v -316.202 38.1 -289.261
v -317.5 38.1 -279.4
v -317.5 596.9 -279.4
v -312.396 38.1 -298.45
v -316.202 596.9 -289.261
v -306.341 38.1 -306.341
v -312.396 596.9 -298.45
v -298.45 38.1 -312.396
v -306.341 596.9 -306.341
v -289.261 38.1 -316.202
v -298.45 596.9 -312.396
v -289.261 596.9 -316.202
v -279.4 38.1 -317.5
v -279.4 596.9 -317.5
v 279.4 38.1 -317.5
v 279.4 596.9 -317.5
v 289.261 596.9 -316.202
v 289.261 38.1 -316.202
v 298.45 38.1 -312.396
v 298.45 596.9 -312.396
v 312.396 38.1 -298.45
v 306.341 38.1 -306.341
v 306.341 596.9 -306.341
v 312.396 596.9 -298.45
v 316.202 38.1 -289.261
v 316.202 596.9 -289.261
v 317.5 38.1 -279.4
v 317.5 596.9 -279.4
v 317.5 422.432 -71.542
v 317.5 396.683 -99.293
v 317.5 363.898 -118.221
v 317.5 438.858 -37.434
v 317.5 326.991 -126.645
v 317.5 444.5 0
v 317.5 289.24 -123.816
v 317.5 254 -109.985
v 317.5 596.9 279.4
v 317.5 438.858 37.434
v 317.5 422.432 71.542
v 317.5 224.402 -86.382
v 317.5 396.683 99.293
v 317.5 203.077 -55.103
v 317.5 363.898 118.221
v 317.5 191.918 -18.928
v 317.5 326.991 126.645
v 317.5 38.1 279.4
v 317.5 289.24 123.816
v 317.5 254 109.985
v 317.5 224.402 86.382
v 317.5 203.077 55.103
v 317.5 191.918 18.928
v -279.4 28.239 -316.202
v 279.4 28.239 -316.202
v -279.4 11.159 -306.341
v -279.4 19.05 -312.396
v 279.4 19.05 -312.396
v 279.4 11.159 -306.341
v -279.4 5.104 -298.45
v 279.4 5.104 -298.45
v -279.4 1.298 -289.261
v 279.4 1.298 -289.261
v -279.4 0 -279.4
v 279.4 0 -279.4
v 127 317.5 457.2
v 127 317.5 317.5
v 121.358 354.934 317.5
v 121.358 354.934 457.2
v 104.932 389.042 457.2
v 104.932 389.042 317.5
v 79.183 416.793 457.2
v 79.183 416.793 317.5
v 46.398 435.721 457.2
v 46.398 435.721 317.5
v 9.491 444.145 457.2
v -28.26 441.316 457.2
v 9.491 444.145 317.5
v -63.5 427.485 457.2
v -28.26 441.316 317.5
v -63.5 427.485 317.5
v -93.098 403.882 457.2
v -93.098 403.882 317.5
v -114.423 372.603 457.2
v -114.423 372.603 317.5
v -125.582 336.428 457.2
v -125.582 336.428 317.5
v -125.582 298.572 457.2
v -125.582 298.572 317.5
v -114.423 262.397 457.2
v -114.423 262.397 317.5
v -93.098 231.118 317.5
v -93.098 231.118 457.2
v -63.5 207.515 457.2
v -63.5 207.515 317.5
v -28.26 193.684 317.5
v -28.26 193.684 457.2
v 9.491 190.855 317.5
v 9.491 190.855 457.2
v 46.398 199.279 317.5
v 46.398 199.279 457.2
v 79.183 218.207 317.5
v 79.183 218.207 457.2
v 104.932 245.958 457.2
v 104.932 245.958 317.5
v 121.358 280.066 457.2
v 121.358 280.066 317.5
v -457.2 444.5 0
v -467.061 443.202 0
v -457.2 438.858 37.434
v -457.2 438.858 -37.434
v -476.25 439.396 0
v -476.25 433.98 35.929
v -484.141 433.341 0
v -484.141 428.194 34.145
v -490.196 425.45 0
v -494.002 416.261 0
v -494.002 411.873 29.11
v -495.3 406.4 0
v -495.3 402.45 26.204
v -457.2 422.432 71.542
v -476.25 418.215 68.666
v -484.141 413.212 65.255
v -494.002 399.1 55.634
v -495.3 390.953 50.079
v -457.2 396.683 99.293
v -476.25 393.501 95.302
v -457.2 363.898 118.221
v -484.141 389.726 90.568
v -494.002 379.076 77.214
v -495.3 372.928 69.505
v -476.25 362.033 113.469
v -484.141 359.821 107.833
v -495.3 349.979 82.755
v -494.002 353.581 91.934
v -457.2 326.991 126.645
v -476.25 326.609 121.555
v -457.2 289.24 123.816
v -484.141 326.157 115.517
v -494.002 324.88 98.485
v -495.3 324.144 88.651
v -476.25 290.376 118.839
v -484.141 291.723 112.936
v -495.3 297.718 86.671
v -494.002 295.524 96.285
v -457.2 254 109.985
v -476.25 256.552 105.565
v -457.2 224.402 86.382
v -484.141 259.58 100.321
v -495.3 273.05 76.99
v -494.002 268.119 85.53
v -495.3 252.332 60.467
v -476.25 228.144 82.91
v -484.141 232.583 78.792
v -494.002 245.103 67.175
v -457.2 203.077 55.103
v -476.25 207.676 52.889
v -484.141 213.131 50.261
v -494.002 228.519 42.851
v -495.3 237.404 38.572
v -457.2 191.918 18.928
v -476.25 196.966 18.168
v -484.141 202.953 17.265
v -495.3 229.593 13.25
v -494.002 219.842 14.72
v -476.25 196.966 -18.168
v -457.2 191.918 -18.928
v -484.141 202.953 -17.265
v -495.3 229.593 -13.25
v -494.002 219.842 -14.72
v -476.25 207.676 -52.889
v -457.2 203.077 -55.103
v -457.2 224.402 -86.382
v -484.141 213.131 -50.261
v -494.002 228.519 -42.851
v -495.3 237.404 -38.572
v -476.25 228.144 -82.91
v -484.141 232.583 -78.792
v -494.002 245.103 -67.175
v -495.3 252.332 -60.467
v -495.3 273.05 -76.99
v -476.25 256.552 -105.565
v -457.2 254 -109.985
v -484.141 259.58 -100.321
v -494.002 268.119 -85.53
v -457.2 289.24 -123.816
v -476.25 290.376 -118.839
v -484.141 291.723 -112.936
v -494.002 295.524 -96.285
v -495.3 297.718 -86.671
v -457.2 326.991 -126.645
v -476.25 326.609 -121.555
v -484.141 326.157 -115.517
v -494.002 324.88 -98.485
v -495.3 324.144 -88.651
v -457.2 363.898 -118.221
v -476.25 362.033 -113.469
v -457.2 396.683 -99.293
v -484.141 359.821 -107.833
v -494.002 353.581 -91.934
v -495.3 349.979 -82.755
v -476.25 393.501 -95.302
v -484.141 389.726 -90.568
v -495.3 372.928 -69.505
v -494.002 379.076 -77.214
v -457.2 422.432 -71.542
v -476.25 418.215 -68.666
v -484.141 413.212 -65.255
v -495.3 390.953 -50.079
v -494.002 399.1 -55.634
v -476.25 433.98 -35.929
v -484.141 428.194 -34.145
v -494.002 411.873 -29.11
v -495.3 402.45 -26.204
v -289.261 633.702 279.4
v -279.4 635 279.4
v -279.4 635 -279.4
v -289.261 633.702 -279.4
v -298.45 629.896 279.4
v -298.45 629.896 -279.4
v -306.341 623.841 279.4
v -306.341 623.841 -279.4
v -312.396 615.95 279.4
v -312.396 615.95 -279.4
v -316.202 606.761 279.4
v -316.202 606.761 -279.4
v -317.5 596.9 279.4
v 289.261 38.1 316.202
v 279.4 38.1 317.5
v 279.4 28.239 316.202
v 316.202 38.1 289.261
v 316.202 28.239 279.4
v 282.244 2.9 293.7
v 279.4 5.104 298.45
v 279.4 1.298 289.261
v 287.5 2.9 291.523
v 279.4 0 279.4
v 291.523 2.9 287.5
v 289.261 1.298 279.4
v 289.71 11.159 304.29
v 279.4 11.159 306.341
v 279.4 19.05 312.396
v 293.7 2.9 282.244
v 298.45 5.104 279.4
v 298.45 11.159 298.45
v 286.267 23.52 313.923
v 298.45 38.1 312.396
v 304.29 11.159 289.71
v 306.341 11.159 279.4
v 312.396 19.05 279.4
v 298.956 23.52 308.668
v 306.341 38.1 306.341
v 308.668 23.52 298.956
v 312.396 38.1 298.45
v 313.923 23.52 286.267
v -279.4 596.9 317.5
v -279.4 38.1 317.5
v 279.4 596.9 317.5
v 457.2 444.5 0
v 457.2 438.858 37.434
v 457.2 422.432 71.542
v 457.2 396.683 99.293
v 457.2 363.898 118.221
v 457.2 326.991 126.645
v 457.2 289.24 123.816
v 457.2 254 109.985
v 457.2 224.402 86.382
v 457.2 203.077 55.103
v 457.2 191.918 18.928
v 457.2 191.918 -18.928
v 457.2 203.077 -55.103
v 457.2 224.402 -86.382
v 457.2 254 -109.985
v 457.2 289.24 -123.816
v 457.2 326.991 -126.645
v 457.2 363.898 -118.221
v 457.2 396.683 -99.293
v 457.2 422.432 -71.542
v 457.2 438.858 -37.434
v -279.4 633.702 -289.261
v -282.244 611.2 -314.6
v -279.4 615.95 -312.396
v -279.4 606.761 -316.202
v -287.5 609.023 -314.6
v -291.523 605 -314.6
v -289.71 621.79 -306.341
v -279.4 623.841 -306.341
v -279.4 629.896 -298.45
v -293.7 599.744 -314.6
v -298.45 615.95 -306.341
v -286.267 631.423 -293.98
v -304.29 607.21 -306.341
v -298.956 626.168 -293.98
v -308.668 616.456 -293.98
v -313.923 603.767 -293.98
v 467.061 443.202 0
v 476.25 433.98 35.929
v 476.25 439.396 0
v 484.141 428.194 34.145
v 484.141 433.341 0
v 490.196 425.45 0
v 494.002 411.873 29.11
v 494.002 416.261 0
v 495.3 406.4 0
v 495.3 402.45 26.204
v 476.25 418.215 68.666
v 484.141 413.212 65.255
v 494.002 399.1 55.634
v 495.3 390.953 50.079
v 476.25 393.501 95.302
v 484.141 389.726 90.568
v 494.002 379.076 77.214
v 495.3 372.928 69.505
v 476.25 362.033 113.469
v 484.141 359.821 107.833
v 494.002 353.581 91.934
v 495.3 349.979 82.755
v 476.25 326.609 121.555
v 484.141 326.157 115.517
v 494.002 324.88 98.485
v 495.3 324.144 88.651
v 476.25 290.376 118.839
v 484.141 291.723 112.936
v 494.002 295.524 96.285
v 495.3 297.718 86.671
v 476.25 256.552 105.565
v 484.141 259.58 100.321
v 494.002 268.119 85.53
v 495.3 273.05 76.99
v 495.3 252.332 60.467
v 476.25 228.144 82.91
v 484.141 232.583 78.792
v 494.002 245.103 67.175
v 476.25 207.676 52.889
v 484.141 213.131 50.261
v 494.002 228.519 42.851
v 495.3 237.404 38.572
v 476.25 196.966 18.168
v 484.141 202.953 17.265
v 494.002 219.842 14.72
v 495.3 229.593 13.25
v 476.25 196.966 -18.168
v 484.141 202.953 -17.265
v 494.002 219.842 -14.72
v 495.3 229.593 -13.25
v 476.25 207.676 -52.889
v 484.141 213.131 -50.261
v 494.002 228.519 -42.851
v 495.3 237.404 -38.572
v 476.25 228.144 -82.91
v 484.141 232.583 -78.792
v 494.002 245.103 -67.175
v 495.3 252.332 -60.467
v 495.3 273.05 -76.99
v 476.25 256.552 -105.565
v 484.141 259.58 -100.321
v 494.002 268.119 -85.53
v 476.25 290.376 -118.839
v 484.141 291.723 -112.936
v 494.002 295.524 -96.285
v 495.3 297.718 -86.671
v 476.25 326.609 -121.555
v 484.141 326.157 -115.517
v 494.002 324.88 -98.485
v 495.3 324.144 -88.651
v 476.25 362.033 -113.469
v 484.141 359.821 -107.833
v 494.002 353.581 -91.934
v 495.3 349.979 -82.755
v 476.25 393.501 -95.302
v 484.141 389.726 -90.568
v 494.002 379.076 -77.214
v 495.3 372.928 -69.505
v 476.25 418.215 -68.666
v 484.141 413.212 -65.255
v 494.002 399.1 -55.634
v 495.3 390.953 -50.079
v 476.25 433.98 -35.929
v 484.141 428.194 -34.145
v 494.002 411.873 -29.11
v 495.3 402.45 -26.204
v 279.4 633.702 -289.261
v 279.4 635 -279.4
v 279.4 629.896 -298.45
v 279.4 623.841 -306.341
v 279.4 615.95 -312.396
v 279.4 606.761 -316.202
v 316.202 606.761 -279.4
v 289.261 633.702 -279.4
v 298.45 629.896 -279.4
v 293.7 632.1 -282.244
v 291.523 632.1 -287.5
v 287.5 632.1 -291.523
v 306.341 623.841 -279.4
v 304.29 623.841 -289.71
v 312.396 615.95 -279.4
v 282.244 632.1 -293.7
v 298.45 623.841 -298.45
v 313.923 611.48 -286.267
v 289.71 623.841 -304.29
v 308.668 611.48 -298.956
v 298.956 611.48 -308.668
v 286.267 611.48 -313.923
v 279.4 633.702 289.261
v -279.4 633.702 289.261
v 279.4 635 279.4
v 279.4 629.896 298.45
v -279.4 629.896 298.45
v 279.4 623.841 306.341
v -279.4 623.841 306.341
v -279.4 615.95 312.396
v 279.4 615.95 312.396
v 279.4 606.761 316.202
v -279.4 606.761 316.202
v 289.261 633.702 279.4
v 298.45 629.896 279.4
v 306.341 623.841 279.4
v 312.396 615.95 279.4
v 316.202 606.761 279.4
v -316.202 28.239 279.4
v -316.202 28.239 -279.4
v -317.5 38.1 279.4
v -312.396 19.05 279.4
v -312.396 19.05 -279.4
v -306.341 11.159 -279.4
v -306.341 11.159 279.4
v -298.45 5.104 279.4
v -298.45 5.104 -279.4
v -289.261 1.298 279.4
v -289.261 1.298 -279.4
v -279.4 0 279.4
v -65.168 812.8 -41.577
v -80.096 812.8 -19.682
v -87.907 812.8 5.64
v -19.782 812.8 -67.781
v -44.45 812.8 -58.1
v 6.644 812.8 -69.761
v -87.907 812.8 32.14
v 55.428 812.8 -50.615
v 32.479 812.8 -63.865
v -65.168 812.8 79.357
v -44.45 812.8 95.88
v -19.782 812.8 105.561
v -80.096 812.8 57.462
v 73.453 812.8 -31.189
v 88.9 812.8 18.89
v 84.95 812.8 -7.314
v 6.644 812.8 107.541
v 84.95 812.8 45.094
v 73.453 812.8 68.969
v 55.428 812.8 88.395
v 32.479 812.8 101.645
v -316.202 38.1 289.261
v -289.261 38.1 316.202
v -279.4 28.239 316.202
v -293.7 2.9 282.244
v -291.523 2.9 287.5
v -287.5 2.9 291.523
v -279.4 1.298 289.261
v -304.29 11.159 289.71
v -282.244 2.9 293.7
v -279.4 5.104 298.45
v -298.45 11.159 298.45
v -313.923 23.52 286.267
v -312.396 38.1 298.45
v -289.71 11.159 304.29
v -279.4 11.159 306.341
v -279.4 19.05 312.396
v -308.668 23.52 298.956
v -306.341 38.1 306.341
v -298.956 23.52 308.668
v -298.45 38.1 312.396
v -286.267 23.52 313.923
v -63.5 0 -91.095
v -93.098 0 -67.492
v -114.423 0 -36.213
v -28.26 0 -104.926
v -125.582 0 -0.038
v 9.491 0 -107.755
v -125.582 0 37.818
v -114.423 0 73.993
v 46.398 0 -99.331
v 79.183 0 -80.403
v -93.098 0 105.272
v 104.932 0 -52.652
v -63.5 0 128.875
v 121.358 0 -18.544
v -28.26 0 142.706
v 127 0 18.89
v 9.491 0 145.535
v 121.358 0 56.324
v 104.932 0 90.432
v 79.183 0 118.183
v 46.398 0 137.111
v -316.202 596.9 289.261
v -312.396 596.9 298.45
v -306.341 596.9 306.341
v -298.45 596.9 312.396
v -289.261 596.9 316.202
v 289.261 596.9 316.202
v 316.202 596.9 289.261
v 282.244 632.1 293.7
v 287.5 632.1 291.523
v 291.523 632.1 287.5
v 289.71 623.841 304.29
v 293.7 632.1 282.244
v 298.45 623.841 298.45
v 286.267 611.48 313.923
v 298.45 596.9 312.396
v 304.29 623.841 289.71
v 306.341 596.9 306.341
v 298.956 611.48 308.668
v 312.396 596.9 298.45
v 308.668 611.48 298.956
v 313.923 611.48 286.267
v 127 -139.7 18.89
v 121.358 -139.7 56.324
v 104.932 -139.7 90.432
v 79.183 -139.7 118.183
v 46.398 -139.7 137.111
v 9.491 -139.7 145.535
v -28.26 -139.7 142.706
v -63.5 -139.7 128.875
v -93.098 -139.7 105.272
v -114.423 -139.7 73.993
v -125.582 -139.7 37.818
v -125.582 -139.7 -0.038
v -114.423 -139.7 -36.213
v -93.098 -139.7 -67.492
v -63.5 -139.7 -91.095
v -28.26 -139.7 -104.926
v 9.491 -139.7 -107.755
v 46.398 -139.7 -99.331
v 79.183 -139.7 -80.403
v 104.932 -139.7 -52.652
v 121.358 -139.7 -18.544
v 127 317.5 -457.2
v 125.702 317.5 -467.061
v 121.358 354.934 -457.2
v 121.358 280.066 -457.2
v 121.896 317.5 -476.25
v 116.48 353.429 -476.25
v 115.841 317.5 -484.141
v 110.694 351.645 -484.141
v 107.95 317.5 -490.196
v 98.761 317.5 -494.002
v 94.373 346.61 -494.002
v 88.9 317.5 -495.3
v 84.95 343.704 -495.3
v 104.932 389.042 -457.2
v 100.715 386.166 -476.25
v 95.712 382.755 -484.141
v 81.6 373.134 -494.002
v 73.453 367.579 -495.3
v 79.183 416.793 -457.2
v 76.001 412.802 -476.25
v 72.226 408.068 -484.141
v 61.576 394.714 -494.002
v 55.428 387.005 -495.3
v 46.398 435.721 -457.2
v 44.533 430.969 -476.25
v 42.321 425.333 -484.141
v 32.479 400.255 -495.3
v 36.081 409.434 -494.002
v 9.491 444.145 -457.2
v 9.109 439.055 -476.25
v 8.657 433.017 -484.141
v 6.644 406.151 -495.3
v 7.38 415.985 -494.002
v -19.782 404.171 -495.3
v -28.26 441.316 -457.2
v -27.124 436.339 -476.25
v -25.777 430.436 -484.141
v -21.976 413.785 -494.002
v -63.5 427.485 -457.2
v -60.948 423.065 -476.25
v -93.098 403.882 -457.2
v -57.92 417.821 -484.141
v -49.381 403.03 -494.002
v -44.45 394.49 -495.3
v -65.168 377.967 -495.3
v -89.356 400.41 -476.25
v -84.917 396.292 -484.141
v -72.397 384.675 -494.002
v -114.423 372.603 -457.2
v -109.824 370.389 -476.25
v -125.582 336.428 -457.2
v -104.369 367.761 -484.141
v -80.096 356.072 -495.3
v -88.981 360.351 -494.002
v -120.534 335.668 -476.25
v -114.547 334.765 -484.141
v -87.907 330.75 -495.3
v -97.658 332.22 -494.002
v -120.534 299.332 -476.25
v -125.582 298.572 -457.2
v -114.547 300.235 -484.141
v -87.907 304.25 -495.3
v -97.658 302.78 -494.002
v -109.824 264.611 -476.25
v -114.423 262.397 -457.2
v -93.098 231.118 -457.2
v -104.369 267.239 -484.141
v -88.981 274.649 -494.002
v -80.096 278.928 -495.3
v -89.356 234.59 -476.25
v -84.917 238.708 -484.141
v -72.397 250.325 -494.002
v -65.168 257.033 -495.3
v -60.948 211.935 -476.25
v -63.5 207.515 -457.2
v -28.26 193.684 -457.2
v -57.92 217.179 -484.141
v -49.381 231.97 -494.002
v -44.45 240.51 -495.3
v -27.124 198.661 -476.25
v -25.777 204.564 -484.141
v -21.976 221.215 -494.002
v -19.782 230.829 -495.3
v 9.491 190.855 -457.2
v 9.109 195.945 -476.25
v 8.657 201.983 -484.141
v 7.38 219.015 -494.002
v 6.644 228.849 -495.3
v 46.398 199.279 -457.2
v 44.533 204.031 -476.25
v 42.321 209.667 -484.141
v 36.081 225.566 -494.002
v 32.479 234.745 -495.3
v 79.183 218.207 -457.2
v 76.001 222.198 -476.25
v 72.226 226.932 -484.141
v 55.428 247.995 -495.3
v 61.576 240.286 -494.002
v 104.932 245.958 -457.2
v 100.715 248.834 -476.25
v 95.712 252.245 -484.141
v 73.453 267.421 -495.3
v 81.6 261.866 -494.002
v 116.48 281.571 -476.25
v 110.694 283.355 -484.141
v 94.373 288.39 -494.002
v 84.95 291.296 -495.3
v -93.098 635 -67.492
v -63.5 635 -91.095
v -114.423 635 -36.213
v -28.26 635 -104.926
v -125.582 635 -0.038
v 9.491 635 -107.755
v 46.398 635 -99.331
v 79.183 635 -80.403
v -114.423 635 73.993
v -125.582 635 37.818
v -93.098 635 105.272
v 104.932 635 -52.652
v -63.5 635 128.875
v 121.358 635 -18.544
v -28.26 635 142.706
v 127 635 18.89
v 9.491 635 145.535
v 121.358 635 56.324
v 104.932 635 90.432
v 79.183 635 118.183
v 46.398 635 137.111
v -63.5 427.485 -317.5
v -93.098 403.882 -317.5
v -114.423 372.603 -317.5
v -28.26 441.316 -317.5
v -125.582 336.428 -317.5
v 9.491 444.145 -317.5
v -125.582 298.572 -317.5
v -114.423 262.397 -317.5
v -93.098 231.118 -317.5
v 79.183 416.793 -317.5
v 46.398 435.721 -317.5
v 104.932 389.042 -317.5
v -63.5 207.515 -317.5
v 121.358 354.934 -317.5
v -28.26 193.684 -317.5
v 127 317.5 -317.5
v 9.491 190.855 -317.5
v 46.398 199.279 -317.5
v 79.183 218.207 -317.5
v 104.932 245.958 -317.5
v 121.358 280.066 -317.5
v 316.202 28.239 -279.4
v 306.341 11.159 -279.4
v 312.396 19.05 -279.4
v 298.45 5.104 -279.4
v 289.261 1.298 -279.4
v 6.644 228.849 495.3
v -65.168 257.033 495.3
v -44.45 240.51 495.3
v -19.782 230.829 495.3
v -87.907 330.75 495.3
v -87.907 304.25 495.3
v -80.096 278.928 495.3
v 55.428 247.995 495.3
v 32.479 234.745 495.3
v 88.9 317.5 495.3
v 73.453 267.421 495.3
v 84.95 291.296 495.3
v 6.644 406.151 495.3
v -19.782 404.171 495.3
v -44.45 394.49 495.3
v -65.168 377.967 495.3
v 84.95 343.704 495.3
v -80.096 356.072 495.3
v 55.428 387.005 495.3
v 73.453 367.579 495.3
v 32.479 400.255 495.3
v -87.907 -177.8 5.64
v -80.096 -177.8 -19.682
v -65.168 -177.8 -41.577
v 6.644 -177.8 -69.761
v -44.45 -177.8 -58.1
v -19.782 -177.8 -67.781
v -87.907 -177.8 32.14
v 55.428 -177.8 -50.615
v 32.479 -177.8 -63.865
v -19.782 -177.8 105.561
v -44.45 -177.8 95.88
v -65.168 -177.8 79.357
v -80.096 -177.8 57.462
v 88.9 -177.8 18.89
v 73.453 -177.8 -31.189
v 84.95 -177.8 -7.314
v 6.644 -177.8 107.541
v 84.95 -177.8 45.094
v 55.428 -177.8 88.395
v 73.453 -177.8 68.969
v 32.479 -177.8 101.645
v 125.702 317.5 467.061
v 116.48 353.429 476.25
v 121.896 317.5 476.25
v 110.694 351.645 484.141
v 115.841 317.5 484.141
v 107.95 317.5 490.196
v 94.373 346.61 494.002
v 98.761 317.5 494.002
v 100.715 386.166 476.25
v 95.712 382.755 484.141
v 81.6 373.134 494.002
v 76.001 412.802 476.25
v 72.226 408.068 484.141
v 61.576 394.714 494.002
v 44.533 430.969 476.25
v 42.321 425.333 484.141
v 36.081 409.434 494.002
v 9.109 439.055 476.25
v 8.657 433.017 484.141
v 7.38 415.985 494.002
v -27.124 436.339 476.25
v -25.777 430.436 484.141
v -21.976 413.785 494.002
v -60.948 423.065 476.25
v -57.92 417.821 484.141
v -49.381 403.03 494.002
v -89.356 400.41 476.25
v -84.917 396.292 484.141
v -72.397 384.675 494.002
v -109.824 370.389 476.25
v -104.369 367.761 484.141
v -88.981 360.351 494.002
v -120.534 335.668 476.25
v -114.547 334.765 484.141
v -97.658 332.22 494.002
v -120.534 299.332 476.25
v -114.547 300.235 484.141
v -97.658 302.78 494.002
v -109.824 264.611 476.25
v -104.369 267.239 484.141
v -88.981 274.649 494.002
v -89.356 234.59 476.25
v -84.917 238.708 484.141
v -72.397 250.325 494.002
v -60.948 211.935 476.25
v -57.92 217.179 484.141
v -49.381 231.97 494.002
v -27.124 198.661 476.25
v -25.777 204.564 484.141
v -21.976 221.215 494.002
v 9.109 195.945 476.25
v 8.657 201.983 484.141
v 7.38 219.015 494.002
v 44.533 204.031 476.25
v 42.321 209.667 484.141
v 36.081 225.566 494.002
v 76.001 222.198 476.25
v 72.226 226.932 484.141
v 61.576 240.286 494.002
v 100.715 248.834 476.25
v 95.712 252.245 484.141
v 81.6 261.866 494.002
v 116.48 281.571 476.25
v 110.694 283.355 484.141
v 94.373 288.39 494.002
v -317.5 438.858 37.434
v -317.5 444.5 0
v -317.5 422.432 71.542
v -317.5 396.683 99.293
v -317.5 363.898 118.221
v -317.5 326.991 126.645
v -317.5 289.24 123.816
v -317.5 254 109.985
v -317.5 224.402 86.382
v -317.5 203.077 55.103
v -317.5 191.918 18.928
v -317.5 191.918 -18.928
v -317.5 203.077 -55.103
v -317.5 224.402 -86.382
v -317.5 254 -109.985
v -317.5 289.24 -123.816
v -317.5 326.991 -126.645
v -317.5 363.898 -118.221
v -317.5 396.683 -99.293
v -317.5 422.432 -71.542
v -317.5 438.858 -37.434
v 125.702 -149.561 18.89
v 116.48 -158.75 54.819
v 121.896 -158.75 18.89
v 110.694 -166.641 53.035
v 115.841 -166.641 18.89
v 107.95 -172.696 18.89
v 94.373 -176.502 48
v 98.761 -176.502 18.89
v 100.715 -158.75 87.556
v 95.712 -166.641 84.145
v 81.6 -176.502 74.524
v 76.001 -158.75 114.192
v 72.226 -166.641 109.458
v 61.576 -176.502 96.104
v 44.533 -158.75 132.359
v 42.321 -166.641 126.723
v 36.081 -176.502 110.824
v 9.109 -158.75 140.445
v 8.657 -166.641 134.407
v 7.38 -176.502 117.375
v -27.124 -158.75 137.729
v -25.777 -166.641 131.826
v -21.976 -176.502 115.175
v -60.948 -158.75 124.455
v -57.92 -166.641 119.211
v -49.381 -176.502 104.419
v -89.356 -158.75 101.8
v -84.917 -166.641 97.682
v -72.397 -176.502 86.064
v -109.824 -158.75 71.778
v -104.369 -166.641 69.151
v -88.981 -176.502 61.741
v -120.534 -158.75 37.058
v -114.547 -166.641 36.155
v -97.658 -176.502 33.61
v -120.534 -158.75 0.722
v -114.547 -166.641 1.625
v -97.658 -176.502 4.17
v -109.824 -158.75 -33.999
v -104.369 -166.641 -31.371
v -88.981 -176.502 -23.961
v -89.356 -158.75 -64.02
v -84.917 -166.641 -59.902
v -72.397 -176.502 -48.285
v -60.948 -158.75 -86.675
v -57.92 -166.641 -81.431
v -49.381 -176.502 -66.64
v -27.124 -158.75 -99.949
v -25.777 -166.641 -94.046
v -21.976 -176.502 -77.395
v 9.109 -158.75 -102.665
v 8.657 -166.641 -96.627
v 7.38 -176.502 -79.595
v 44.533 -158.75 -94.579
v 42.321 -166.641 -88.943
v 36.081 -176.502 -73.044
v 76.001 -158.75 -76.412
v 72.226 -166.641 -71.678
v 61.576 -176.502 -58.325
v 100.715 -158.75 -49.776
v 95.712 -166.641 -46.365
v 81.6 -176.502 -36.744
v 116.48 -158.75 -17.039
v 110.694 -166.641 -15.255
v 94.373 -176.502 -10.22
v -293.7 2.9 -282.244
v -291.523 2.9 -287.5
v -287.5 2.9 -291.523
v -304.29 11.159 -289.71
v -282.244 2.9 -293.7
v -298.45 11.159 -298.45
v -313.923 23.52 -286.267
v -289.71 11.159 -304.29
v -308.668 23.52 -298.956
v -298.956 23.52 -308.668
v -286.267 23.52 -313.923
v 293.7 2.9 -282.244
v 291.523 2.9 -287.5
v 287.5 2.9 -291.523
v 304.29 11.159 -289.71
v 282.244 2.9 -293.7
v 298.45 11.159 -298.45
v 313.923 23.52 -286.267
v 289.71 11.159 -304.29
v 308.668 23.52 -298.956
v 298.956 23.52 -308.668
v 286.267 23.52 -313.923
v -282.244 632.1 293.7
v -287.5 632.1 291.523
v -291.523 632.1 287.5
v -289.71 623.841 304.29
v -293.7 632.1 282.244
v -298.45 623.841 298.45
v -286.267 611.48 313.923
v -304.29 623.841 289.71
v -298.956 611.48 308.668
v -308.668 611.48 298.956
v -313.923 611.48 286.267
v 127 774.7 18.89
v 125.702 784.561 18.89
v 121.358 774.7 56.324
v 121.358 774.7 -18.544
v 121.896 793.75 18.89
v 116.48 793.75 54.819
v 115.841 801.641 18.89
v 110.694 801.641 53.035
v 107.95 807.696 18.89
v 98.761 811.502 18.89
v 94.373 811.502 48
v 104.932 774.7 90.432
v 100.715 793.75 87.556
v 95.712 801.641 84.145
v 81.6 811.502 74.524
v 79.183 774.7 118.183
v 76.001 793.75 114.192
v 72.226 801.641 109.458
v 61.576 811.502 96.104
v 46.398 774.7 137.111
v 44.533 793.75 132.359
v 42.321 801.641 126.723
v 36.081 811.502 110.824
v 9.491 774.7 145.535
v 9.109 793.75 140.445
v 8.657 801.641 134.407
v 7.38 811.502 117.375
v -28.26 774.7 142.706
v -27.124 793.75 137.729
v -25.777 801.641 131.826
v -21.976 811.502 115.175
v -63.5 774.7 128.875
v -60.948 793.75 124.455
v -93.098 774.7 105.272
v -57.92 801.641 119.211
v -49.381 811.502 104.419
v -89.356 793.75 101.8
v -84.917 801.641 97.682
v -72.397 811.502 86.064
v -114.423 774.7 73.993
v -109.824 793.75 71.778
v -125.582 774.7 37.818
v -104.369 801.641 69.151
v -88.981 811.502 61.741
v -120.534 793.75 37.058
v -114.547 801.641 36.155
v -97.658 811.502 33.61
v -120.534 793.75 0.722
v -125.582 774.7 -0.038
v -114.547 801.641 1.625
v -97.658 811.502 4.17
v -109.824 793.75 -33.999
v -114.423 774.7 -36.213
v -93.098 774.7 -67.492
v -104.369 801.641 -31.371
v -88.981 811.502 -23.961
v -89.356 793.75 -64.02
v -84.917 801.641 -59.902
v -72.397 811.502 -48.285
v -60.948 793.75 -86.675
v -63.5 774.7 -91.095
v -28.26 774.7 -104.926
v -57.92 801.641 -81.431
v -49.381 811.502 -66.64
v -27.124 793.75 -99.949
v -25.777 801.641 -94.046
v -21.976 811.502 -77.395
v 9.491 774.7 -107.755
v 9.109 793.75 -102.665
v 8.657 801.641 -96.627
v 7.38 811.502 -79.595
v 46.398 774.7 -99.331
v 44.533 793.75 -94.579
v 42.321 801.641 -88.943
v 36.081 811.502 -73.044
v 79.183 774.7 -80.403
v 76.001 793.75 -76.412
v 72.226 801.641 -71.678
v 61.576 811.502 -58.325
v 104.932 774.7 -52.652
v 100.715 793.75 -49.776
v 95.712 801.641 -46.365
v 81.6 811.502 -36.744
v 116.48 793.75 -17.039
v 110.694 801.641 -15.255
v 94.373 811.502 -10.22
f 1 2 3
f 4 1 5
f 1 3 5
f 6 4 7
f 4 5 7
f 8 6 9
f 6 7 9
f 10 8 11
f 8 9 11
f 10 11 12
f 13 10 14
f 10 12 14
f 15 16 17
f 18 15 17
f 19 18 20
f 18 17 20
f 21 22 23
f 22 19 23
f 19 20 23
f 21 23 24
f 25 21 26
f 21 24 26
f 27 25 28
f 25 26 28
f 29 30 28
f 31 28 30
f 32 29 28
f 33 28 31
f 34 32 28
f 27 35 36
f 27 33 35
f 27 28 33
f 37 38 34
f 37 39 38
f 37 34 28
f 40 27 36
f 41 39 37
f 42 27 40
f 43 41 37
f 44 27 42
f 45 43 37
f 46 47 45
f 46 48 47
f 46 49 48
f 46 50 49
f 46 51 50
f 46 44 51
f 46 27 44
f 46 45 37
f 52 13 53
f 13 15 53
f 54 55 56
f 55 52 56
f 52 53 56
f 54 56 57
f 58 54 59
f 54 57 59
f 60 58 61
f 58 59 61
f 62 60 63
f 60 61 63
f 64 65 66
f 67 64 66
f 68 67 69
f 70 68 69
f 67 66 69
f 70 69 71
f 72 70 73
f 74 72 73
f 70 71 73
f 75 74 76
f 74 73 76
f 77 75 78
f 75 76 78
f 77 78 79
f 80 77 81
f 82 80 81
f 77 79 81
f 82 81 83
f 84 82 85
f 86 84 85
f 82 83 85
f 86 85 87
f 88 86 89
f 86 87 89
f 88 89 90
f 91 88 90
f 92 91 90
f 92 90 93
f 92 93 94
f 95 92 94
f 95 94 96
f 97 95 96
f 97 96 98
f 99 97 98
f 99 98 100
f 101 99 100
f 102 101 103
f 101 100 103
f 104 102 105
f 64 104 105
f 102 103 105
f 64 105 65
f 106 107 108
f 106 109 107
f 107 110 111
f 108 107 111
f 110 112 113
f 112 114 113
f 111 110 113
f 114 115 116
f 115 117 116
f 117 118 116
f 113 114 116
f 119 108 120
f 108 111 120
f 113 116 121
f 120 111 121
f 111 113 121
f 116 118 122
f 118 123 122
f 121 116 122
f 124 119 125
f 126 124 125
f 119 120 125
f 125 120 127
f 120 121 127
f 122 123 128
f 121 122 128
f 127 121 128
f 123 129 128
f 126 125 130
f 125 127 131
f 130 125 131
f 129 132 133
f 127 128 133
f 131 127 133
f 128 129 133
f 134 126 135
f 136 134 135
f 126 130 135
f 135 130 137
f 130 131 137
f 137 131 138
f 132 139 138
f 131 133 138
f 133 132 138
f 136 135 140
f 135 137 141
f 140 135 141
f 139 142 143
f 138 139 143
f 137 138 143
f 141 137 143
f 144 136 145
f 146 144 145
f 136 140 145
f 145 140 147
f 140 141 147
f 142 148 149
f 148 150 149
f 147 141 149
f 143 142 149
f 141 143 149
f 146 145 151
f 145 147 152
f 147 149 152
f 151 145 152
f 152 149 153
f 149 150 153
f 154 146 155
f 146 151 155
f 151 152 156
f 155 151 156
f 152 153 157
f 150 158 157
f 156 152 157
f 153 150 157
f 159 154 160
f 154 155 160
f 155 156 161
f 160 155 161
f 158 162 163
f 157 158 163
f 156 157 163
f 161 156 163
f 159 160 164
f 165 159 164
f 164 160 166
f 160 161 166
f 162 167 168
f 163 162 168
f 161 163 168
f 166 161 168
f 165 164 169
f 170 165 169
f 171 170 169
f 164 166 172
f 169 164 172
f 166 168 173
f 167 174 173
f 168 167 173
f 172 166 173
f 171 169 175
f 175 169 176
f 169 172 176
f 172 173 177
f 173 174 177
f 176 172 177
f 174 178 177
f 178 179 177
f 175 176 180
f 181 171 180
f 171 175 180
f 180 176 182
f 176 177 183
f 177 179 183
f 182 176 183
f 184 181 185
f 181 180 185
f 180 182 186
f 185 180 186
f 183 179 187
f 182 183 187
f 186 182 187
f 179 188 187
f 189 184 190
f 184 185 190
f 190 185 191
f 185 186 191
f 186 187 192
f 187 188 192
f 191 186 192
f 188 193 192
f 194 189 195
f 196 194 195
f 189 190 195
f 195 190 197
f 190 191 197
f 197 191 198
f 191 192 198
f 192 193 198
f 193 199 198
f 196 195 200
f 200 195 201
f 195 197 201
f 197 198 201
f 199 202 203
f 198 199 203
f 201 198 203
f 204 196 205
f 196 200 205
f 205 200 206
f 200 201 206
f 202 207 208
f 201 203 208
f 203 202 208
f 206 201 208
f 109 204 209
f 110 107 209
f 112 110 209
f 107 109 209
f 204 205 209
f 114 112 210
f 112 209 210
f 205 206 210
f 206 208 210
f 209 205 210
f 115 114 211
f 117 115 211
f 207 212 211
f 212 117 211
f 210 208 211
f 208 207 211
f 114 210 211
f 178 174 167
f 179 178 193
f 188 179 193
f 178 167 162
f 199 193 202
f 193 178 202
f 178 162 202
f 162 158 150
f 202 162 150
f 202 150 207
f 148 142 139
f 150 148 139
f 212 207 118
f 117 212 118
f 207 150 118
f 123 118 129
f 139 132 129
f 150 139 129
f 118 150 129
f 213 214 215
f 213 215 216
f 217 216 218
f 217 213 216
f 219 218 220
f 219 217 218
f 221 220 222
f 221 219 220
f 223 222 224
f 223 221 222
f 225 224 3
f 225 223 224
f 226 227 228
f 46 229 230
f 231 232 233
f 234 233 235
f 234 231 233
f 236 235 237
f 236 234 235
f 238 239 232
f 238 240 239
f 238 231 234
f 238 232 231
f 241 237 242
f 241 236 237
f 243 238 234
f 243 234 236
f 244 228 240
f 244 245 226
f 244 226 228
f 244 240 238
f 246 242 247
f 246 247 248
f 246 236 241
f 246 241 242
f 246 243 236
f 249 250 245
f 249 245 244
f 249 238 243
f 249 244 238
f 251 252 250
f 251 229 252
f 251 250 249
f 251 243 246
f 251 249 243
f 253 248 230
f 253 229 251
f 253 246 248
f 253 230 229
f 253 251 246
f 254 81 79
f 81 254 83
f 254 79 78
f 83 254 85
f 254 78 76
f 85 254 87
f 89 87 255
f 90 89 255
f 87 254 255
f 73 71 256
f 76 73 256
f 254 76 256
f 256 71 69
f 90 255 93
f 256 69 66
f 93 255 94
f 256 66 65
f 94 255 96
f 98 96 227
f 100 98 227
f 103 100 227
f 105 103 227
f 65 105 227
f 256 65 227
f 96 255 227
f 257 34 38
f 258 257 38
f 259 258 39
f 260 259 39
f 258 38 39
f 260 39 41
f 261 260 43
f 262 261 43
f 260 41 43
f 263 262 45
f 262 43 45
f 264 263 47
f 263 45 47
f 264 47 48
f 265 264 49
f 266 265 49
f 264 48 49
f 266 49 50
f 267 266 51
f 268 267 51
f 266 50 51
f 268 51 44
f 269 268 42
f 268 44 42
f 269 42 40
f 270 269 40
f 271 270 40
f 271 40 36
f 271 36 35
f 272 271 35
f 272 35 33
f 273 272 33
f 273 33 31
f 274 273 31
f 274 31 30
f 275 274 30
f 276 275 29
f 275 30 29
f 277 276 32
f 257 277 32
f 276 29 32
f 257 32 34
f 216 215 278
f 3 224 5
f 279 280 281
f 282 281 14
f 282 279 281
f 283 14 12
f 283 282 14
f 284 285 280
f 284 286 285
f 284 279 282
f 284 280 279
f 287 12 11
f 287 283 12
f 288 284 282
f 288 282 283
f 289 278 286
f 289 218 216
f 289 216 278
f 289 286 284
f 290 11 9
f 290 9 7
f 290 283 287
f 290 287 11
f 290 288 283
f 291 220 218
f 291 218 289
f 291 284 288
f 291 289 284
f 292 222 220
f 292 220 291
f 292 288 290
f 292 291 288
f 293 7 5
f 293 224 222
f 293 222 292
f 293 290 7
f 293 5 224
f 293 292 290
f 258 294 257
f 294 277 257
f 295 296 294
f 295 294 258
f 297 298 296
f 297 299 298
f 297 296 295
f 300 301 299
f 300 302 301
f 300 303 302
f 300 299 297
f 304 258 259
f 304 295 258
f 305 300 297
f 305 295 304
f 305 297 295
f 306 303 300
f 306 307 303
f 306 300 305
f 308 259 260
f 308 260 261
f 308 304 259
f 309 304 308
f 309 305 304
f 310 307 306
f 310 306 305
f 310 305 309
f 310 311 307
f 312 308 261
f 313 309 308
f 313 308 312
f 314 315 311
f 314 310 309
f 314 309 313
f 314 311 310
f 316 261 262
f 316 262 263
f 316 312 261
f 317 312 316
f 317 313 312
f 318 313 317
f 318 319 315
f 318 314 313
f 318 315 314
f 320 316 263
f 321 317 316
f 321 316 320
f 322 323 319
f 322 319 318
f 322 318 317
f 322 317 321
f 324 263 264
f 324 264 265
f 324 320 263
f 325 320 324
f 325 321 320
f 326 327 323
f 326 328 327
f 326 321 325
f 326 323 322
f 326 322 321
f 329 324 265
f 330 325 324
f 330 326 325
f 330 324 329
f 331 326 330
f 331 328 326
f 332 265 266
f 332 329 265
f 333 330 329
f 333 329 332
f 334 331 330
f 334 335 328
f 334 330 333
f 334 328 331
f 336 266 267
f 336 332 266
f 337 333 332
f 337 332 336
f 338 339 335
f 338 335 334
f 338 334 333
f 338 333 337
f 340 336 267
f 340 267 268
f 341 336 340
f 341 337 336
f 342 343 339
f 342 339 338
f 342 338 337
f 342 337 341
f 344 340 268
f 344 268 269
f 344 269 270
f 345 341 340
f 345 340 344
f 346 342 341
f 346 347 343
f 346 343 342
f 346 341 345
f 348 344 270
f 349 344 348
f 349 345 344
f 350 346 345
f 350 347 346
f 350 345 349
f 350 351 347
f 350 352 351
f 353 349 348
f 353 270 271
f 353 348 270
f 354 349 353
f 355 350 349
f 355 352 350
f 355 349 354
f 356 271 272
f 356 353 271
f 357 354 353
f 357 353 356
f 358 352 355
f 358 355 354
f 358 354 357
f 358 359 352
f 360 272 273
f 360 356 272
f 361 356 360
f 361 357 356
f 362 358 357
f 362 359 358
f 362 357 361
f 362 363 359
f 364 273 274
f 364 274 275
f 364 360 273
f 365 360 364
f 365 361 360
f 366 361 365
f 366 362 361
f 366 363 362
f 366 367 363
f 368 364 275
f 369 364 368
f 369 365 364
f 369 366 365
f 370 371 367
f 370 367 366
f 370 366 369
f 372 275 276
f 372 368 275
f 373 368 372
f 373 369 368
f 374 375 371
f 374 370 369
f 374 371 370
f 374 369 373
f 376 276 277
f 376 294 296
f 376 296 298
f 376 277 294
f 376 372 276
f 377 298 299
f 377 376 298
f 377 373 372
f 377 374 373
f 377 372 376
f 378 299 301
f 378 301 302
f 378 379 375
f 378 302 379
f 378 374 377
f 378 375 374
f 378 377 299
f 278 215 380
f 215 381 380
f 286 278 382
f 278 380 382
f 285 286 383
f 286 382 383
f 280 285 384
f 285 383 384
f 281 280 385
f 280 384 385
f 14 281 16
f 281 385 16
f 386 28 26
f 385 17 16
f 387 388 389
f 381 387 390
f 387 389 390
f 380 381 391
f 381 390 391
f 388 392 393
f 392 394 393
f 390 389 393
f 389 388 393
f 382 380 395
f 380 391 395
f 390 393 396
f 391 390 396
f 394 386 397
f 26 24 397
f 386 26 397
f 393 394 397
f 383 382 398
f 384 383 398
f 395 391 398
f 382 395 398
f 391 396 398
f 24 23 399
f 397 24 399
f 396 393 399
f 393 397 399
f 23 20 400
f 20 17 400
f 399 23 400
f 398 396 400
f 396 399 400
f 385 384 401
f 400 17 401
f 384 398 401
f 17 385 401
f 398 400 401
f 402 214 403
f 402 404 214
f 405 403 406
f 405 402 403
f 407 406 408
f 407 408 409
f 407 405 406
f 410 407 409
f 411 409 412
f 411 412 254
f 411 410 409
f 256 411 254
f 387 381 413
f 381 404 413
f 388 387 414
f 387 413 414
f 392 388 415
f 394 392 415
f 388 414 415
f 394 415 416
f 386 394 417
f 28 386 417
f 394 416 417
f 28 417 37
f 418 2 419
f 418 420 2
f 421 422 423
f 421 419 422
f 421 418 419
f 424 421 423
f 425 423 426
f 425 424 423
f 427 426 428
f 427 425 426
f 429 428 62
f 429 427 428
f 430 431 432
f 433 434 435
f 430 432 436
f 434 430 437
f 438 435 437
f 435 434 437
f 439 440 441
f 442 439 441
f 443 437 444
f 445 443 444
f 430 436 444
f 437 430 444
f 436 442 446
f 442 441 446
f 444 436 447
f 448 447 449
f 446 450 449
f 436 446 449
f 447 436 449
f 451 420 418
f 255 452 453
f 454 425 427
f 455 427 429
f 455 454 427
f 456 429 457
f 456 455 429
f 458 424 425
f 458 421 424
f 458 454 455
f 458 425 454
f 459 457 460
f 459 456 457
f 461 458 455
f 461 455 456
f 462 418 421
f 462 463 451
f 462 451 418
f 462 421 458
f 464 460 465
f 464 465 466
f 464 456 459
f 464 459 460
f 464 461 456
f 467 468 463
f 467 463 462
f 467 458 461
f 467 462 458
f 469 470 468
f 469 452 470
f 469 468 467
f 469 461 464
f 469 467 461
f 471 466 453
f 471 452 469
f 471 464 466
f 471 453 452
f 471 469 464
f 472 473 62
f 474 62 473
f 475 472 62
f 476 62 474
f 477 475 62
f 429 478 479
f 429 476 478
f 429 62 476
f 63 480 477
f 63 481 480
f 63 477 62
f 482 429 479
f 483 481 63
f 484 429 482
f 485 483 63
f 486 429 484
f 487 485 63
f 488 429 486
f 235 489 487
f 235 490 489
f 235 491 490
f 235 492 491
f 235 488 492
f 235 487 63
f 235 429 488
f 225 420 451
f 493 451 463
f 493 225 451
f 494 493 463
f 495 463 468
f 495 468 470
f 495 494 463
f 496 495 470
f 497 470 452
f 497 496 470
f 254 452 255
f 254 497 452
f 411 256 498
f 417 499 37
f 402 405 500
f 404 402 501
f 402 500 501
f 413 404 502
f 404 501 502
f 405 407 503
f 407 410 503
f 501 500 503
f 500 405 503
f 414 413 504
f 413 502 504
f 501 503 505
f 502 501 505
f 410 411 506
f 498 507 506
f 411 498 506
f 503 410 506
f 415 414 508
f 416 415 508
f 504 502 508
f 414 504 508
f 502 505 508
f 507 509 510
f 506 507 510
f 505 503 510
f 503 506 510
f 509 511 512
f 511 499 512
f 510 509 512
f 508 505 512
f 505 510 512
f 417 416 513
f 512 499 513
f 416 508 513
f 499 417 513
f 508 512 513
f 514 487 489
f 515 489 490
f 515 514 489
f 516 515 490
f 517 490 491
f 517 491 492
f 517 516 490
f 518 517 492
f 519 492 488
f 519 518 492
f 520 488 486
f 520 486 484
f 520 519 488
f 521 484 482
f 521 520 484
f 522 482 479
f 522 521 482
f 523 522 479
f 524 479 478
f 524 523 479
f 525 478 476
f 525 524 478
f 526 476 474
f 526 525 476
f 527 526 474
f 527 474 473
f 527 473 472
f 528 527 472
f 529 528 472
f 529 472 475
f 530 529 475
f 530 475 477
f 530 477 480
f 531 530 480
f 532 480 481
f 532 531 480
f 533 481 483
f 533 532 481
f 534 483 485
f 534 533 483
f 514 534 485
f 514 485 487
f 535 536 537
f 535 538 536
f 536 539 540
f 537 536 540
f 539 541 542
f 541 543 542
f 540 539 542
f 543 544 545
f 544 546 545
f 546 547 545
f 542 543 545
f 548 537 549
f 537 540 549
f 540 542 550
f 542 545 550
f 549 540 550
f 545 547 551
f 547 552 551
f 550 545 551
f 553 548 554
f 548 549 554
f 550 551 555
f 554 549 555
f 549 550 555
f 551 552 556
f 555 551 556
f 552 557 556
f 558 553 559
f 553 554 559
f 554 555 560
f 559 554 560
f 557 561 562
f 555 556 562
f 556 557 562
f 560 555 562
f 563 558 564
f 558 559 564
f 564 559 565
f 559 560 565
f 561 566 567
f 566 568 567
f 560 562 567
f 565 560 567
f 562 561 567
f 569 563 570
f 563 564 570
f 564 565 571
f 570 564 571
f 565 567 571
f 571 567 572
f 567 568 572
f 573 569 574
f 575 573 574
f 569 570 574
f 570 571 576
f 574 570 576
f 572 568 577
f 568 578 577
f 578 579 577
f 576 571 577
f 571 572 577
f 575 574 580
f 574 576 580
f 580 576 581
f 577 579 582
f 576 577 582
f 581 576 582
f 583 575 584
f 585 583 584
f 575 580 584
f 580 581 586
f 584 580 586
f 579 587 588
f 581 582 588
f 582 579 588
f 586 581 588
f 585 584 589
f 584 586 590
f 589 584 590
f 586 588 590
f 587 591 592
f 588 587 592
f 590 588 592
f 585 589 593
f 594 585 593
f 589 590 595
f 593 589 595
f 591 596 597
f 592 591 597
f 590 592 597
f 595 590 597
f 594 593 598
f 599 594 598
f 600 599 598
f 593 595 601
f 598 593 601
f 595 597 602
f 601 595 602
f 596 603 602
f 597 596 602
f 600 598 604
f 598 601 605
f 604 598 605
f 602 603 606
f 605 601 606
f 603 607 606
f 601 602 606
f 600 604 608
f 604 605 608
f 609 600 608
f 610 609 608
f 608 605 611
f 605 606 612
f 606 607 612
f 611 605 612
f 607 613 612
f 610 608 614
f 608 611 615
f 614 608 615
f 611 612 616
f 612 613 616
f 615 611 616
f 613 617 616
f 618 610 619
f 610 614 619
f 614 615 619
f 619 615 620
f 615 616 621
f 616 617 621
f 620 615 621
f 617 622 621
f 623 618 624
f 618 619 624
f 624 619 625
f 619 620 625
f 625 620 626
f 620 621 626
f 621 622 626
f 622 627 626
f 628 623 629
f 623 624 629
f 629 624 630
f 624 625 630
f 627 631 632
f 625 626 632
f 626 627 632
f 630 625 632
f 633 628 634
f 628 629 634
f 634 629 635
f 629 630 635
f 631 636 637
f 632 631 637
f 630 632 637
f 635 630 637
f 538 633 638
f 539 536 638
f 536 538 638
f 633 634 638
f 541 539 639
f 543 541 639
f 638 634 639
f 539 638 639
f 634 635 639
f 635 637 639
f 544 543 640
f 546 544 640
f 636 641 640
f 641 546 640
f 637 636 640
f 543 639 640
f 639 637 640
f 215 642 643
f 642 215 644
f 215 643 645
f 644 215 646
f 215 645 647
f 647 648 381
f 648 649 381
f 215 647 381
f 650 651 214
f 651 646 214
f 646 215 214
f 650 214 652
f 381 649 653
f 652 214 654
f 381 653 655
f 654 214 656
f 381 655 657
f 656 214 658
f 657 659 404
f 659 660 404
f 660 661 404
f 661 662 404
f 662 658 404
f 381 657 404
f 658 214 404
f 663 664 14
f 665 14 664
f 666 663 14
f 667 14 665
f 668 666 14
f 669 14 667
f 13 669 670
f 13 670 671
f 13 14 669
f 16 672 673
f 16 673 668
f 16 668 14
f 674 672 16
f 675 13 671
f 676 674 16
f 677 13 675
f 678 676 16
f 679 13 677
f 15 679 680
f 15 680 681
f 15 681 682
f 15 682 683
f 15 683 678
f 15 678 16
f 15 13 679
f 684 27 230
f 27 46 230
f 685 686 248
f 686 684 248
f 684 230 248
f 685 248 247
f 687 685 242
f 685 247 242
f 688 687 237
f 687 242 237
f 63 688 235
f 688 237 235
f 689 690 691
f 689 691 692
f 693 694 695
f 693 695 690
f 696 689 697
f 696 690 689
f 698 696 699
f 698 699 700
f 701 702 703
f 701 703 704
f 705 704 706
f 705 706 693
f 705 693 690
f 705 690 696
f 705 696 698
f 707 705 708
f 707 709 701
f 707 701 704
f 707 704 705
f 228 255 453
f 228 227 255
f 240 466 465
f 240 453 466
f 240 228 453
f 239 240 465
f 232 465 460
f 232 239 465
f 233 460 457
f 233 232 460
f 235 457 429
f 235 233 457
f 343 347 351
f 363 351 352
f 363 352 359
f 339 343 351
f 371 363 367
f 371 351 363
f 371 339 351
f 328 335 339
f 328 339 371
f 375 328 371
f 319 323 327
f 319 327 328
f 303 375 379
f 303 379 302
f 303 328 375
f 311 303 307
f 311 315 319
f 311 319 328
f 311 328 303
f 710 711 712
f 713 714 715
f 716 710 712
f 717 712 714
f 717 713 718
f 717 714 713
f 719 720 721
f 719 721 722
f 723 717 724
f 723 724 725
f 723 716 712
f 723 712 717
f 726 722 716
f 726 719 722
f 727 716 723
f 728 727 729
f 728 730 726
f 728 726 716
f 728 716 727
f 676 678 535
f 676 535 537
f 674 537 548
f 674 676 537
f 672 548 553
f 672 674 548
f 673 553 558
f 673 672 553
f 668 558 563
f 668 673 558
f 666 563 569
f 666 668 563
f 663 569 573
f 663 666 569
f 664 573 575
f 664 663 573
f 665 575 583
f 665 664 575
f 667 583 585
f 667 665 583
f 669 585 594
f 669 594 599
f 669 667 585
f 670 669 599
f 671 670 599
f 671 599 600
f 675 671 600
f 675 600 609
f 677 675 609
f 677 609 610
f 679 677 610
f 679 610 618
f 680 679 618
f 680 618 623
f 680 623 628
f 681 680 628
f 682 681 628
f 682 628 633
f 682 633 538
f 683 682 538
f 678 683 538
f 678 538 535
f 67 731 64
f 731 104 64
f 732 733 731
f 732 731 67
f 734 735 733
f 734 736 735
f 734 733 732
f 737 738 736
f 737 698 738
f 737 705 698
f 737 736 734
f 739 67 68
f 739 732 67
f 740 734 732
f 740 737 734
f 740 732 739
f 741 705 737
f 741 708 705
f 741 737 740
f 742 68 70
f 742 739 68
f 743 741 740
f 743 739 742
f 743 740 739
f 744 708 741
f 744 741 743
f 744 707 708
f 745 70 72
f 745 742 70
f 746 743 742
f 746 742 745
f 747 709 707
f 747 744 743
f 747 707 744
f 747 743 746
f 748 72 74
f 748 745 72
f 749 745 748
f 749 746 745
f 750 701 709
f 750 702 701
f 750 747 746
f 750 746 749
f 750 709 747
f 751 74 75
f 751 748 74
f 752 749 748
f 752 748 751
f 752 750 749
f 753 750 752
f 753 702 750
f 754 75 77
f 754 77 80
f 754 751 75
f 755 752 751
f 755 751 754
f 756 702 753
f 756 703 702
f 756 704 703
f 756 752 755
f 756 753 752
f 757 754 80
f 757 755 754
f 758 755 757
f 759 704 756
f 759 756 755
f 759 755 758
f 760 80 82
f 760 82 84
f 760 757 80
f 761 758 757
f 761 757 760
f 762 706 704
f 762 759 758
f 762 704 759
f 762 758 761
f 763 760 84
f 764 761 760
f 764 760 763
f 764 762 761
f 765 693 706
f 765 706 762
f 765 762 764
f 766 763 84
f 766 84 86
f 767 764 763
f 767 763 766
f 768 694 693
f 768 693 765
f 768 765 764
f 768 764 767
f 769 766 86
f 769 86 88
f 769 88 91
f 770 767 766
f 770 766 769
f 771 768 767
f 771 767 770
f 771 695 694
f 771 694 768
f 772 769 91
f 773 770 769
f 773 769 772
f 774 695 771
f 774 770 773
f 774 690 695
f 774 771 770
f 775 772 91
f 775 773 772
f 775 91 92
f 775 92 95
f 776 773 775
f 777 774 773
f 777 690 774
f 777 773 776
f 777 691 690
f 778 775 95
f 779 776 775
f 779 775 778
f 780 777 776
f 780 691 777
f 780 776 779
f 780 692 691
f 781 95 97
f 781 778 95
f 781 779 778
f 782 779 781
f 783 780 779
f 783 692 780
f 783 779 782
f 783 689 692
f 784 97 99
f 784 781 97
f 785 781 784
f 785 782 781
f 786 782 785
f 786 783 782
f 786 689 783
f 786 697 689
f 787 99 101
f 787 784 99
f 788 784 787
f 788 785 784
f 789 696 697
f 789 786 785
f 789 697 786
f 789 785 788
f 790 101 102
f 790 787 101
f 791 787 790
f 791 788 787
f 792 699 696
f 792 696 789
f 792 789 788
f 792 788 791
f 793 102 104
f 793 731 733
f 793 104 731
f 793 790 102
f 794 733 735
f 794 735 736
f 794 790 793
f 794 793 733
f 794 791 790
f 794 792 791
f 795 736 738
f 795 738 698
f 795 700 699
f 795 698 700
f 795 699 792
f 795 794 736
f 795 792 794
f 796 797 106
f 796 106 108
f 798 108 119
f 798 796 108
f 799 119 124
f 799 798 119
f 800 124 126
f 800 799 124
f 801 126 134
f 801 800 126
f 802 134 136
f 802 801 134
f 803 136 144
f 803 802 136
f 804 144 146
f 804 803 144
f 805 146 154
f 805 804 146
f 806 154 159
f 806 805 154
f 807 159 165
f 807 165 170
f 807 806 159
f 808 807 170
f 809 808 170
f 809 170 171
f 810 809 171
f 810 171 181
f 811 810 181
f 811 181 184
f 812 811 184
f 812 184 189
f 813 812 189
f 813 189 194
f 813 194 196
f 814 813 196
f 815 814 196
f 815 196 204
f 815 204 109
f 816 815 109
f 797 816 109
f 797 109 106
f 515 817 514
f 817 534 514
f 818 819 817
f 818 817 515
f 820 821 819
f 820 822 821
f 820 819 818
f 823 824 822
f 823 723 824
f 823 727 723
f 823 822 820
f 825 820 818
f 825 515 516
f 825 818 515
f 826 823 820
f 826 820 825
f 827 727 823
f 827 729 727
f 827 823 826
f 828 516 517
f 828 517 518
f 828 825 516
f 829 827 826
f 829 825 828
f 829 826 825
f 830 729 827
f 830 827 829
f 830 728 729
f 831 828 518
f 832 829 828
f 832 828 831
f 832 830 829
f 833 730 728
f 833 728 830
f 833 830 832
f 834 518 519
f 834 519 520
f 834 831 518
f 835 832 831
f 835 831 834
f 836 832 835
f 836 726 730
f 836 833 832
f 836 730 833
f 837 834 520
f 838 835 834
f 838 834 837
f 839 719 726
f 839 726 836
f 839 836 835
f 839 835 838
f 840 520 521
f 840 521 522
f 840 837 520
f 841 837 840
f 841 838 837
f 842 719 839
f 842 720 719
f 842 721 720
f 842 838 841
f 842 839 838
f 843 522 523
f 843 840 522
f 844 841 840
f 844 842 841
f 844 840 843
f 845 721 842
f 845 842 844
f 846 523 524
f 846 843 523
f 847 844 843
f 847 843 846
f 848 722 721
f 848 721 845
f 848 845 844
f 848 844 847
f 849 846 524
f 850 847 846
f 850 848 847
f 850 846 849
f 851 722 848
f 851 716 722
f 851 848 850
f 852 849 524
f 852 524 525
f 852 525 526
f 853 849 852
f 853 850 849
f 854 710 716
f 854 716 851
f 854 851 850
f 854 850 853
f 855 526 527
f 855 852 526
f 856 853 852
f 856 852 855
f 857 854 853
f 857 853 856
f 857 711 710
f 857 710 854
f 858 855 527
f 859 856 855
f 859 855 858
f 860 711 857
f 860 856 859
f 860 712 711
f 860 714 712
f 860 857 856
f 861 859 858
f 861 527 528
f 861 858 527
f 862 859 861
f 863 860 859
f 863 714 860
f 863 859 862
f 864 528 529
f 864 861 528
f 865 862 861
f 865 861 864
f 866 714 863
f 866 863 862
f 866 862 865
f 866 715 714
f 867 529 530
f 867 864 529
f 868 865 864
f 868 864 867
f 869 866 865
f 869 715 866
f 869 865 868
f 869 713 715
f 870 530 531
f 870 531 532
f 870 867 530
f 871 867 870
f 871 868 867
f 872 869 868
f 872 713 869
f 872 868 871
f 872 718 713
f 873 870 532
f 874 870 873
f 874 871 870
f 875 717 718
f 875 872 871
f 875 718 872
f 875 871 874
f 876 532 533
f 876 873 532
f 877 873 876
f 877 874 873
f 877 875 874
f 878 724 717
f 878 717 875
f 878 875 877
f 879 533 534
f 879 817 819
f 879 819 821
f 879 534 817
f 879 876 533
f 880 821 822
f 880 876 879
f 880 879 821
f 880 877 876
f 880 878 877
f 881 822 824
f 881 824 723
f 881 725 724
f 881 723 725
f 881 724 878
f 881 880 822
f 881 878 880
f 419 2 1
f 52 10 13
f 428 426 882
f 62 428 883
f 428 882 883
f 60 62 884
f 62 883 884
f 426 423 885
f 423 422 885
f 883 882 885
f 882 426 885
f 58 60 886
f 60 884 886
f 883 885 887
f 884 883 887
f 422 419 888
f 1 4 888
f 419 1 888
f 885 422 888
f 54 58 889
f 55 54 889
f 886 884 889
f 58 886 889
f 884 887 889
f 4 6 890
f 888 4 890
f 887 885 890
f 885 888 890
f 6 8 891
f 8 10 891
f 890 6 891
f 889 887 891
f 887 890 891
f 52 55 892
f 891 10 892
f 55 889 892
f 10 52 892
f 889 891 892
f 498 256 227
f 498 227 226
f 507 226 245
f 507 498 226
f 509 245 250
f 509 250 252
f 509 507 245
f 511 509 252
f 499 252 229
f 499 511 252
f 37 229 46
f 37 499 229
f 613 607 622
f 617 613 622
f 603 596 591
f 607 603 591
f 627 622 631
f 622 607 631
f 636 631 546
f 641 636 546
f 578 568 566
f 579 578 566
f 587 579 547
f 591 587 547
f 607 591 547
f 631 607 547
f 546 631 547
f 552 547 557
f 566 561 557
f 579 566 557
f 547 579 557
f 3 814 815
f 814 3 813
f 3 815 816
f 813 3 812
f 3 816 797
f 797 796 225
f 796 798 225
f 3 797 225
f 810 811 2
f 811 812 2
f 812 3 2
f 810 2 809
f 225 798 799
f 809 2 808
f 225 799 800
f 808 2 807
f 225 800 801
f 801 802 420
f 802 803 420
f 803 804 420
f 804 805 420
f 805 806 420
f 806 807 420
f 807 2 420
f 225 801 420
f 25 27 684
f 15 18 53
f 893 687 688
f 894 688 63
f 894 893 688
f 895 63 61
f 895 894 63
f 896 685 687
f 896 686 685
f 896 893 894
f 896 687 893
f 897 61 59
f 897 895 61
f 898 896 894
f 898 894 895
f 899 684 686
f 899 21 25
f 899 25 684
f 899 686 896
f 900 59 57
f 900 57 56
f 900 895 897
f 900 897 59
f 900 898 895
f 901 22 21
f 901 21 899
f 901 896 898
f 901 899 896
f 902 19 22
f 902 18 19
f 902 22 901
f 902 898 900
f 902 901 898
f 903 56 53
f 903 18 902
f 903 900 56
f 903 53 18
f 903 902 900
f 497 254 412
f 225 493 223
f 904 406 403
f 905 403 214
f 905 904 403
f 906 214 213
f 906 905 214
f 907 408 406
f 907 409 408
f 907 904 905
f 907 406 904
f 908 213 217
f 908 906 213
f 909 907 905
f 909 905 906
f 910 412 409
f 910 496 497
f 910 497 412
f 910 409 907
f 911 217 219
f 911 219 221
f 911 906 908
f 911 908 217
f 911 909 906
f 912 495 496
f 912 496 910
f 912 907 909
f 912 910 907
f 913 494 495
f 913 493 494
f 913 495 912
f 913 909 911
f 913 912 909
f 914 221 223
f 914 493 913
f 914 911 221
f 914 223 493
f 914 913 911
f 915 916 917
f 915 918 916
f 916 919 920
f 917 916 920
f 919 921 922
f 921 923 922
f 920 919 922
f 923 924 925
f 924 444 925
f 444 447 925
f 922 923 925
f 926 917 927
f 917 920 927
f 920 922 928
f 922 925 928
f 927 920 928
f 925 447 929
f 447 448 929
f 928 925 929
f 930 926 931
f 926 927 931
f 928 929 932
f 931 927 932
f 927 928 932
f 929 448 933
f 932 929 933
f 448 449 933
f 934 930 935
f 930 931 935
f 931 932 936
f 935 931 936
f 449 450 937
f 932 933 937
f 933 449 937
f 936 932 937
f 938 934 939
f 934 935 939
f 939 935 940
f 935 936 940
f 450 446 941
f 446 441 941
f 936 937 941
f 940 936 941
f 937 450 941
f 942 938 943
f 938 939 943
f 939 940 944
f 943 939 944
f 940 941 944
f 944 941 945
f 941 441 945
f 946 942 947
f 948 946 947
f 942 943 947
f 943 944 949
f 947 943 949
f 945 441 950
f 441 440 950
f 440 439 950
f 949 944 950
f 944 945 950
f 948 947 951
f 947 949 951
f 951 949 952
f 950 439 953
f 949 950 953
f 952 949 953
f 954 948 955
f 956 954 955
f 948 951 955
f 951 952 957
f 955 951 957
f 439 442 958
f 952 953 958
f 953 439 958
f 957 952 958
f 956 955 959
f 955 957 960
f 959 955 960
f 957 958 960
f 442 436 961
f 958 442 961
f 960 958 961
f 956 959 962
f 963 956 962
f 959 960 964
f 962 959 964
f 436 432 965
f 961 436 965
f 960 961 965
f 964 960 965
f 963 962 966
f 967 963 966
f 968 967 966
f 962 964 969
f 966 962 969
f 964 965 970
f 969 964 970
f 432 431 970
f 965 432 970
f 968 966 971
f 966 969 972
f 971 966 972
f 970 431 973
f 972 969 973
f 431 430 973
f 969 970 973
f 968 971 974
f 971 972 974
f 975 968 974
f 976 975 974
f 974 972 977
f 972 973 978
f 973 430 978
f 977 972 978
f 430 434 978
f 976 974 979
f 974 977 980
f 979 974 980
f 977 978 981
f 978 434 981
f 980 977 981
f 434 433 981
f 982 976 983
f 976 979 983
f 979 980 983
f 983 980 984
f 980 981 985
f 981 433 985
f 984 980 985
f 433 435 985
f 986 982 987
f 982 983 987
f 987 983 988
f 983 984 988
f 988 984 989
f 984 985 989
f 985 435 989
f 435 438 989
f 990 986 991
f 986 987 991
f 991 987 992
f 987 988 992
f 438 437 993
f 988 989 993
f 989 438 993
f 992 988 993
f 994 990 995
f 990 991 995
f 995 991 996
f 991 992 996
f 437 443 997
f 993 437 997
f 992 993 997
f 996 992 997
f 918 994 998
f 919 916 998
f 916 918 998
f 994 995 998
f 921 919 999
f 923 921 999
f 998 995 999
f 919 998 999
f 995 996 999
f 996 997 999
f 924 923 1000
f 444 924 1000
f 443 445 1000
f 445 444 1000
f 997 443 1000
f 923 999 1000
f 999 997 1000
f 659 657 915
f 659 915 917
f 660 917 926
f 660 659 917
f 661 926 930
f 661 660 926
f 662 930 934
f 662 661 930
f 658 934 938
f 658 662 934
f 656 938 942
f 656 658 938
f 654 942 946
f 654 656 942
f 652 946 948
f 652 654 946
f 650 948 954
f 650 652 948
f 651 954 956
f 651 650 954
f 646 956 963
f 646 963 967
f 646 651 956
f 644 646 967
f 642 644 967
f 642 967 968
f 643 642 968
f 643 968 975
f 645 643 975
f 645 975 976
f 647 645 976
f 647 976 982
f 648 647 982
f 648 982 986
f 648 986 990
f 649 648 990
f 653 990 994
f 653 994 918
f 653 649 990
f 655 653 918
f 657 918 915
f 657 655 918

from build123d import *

# Parameters (mm, degrees)
F0_R          = 127
F1_DEPTH      = 177.8
F1_DEPTH_BACK = 812.8
F0_W          = 635
F0_H          = 635
F2_DEPTH      = 635
F3_R          = 38.1
F4_R          = 127
F5_DEPTH      = 177.8
F5_DEPTH_BACK = 812.8
F6_R          = 127
F7_DEPTH      = 177.8
F7_DEPTH_BACK = 812.8
F8_R          = 38.1


with BuildPart() as f1:
    # F0 (on Front) → F1 (new body, two sides)
    with BuildSketch(Plane.XZ) as f1_sk:
        with Locations((0, 18.889936)):
            Circle(F0_R)
    extrude(amount=F1_DEPTH)
    extrude(f1_sk.sketch, amount=-F1_DEPTH_BACK)

    # F0 (on Front) → F2 (join)
    with BuildSketch(Plane.XZ):
        Rectangle(F0_W, F0_H)
        with Locations((0, 18.889936)):
            Circle(F0_R, mode=Mode.SUBTRACT)
    extrude(amount=-F2_DEPTH)

    # F3
    f3_edges = [f1.edges().sort_by_distance(p)[0] for p in [
        (317.5, 317.5, -317.5),
        (317.5, 317.5, 317.5),
        (-317.5, 317.5, 317.5),
        (0, 635, 317.5),
        (-317.5, 635, 0),
        (317.5, 635, 0),
        (0, 635, -317.5),
        (-317.5, 317.5, -317.5),
        (-317.5, 0, 0),
        (0, 0, 317.5),
        (317.5, 0, 0),
        (0, 0, -317.5),
    ]]
    fillet(f3_edges, radius=F3_R)

    # F4 (on face) → F5 (join, two sides)
    with BuildSketch(Plane.XY.offset(317.5)) as f5_sk:
        with Locations((0, 317.5)):
            Circle(F4_R)
    extrude(amount=F5_DEPTH)
    extrude(f5_sk.sketch, amount=-F5_DEPTH_BACK)

    # F6 (on face) → F7 (join, two sides)
    with BuildSketch(Plane.YZ.offset(317.5)) as f7_sk:
        with Locations((317.5, 0)):
            Circle(F6_R)
    extrude(amount=F7_DEPTH)
    extrude(f7_sk.sketch, amount=-F7_DEPTH_BACK)

    # F8
    f8_edges = [f1.edges().sort_by_distance(p)[0] for p in [
        (-127, 812.8, 18.889936),
        (495.3, 190.5, 0),
        (-127, 317.5, 495.3),
        (-495.3, 190.5, 0),
        (-127, -177.8, 18.889936),
        (-127, 317.5, -495.3),
    ]]
    fillet(f8_edges, radius=F8_R)


solid = f1.part
